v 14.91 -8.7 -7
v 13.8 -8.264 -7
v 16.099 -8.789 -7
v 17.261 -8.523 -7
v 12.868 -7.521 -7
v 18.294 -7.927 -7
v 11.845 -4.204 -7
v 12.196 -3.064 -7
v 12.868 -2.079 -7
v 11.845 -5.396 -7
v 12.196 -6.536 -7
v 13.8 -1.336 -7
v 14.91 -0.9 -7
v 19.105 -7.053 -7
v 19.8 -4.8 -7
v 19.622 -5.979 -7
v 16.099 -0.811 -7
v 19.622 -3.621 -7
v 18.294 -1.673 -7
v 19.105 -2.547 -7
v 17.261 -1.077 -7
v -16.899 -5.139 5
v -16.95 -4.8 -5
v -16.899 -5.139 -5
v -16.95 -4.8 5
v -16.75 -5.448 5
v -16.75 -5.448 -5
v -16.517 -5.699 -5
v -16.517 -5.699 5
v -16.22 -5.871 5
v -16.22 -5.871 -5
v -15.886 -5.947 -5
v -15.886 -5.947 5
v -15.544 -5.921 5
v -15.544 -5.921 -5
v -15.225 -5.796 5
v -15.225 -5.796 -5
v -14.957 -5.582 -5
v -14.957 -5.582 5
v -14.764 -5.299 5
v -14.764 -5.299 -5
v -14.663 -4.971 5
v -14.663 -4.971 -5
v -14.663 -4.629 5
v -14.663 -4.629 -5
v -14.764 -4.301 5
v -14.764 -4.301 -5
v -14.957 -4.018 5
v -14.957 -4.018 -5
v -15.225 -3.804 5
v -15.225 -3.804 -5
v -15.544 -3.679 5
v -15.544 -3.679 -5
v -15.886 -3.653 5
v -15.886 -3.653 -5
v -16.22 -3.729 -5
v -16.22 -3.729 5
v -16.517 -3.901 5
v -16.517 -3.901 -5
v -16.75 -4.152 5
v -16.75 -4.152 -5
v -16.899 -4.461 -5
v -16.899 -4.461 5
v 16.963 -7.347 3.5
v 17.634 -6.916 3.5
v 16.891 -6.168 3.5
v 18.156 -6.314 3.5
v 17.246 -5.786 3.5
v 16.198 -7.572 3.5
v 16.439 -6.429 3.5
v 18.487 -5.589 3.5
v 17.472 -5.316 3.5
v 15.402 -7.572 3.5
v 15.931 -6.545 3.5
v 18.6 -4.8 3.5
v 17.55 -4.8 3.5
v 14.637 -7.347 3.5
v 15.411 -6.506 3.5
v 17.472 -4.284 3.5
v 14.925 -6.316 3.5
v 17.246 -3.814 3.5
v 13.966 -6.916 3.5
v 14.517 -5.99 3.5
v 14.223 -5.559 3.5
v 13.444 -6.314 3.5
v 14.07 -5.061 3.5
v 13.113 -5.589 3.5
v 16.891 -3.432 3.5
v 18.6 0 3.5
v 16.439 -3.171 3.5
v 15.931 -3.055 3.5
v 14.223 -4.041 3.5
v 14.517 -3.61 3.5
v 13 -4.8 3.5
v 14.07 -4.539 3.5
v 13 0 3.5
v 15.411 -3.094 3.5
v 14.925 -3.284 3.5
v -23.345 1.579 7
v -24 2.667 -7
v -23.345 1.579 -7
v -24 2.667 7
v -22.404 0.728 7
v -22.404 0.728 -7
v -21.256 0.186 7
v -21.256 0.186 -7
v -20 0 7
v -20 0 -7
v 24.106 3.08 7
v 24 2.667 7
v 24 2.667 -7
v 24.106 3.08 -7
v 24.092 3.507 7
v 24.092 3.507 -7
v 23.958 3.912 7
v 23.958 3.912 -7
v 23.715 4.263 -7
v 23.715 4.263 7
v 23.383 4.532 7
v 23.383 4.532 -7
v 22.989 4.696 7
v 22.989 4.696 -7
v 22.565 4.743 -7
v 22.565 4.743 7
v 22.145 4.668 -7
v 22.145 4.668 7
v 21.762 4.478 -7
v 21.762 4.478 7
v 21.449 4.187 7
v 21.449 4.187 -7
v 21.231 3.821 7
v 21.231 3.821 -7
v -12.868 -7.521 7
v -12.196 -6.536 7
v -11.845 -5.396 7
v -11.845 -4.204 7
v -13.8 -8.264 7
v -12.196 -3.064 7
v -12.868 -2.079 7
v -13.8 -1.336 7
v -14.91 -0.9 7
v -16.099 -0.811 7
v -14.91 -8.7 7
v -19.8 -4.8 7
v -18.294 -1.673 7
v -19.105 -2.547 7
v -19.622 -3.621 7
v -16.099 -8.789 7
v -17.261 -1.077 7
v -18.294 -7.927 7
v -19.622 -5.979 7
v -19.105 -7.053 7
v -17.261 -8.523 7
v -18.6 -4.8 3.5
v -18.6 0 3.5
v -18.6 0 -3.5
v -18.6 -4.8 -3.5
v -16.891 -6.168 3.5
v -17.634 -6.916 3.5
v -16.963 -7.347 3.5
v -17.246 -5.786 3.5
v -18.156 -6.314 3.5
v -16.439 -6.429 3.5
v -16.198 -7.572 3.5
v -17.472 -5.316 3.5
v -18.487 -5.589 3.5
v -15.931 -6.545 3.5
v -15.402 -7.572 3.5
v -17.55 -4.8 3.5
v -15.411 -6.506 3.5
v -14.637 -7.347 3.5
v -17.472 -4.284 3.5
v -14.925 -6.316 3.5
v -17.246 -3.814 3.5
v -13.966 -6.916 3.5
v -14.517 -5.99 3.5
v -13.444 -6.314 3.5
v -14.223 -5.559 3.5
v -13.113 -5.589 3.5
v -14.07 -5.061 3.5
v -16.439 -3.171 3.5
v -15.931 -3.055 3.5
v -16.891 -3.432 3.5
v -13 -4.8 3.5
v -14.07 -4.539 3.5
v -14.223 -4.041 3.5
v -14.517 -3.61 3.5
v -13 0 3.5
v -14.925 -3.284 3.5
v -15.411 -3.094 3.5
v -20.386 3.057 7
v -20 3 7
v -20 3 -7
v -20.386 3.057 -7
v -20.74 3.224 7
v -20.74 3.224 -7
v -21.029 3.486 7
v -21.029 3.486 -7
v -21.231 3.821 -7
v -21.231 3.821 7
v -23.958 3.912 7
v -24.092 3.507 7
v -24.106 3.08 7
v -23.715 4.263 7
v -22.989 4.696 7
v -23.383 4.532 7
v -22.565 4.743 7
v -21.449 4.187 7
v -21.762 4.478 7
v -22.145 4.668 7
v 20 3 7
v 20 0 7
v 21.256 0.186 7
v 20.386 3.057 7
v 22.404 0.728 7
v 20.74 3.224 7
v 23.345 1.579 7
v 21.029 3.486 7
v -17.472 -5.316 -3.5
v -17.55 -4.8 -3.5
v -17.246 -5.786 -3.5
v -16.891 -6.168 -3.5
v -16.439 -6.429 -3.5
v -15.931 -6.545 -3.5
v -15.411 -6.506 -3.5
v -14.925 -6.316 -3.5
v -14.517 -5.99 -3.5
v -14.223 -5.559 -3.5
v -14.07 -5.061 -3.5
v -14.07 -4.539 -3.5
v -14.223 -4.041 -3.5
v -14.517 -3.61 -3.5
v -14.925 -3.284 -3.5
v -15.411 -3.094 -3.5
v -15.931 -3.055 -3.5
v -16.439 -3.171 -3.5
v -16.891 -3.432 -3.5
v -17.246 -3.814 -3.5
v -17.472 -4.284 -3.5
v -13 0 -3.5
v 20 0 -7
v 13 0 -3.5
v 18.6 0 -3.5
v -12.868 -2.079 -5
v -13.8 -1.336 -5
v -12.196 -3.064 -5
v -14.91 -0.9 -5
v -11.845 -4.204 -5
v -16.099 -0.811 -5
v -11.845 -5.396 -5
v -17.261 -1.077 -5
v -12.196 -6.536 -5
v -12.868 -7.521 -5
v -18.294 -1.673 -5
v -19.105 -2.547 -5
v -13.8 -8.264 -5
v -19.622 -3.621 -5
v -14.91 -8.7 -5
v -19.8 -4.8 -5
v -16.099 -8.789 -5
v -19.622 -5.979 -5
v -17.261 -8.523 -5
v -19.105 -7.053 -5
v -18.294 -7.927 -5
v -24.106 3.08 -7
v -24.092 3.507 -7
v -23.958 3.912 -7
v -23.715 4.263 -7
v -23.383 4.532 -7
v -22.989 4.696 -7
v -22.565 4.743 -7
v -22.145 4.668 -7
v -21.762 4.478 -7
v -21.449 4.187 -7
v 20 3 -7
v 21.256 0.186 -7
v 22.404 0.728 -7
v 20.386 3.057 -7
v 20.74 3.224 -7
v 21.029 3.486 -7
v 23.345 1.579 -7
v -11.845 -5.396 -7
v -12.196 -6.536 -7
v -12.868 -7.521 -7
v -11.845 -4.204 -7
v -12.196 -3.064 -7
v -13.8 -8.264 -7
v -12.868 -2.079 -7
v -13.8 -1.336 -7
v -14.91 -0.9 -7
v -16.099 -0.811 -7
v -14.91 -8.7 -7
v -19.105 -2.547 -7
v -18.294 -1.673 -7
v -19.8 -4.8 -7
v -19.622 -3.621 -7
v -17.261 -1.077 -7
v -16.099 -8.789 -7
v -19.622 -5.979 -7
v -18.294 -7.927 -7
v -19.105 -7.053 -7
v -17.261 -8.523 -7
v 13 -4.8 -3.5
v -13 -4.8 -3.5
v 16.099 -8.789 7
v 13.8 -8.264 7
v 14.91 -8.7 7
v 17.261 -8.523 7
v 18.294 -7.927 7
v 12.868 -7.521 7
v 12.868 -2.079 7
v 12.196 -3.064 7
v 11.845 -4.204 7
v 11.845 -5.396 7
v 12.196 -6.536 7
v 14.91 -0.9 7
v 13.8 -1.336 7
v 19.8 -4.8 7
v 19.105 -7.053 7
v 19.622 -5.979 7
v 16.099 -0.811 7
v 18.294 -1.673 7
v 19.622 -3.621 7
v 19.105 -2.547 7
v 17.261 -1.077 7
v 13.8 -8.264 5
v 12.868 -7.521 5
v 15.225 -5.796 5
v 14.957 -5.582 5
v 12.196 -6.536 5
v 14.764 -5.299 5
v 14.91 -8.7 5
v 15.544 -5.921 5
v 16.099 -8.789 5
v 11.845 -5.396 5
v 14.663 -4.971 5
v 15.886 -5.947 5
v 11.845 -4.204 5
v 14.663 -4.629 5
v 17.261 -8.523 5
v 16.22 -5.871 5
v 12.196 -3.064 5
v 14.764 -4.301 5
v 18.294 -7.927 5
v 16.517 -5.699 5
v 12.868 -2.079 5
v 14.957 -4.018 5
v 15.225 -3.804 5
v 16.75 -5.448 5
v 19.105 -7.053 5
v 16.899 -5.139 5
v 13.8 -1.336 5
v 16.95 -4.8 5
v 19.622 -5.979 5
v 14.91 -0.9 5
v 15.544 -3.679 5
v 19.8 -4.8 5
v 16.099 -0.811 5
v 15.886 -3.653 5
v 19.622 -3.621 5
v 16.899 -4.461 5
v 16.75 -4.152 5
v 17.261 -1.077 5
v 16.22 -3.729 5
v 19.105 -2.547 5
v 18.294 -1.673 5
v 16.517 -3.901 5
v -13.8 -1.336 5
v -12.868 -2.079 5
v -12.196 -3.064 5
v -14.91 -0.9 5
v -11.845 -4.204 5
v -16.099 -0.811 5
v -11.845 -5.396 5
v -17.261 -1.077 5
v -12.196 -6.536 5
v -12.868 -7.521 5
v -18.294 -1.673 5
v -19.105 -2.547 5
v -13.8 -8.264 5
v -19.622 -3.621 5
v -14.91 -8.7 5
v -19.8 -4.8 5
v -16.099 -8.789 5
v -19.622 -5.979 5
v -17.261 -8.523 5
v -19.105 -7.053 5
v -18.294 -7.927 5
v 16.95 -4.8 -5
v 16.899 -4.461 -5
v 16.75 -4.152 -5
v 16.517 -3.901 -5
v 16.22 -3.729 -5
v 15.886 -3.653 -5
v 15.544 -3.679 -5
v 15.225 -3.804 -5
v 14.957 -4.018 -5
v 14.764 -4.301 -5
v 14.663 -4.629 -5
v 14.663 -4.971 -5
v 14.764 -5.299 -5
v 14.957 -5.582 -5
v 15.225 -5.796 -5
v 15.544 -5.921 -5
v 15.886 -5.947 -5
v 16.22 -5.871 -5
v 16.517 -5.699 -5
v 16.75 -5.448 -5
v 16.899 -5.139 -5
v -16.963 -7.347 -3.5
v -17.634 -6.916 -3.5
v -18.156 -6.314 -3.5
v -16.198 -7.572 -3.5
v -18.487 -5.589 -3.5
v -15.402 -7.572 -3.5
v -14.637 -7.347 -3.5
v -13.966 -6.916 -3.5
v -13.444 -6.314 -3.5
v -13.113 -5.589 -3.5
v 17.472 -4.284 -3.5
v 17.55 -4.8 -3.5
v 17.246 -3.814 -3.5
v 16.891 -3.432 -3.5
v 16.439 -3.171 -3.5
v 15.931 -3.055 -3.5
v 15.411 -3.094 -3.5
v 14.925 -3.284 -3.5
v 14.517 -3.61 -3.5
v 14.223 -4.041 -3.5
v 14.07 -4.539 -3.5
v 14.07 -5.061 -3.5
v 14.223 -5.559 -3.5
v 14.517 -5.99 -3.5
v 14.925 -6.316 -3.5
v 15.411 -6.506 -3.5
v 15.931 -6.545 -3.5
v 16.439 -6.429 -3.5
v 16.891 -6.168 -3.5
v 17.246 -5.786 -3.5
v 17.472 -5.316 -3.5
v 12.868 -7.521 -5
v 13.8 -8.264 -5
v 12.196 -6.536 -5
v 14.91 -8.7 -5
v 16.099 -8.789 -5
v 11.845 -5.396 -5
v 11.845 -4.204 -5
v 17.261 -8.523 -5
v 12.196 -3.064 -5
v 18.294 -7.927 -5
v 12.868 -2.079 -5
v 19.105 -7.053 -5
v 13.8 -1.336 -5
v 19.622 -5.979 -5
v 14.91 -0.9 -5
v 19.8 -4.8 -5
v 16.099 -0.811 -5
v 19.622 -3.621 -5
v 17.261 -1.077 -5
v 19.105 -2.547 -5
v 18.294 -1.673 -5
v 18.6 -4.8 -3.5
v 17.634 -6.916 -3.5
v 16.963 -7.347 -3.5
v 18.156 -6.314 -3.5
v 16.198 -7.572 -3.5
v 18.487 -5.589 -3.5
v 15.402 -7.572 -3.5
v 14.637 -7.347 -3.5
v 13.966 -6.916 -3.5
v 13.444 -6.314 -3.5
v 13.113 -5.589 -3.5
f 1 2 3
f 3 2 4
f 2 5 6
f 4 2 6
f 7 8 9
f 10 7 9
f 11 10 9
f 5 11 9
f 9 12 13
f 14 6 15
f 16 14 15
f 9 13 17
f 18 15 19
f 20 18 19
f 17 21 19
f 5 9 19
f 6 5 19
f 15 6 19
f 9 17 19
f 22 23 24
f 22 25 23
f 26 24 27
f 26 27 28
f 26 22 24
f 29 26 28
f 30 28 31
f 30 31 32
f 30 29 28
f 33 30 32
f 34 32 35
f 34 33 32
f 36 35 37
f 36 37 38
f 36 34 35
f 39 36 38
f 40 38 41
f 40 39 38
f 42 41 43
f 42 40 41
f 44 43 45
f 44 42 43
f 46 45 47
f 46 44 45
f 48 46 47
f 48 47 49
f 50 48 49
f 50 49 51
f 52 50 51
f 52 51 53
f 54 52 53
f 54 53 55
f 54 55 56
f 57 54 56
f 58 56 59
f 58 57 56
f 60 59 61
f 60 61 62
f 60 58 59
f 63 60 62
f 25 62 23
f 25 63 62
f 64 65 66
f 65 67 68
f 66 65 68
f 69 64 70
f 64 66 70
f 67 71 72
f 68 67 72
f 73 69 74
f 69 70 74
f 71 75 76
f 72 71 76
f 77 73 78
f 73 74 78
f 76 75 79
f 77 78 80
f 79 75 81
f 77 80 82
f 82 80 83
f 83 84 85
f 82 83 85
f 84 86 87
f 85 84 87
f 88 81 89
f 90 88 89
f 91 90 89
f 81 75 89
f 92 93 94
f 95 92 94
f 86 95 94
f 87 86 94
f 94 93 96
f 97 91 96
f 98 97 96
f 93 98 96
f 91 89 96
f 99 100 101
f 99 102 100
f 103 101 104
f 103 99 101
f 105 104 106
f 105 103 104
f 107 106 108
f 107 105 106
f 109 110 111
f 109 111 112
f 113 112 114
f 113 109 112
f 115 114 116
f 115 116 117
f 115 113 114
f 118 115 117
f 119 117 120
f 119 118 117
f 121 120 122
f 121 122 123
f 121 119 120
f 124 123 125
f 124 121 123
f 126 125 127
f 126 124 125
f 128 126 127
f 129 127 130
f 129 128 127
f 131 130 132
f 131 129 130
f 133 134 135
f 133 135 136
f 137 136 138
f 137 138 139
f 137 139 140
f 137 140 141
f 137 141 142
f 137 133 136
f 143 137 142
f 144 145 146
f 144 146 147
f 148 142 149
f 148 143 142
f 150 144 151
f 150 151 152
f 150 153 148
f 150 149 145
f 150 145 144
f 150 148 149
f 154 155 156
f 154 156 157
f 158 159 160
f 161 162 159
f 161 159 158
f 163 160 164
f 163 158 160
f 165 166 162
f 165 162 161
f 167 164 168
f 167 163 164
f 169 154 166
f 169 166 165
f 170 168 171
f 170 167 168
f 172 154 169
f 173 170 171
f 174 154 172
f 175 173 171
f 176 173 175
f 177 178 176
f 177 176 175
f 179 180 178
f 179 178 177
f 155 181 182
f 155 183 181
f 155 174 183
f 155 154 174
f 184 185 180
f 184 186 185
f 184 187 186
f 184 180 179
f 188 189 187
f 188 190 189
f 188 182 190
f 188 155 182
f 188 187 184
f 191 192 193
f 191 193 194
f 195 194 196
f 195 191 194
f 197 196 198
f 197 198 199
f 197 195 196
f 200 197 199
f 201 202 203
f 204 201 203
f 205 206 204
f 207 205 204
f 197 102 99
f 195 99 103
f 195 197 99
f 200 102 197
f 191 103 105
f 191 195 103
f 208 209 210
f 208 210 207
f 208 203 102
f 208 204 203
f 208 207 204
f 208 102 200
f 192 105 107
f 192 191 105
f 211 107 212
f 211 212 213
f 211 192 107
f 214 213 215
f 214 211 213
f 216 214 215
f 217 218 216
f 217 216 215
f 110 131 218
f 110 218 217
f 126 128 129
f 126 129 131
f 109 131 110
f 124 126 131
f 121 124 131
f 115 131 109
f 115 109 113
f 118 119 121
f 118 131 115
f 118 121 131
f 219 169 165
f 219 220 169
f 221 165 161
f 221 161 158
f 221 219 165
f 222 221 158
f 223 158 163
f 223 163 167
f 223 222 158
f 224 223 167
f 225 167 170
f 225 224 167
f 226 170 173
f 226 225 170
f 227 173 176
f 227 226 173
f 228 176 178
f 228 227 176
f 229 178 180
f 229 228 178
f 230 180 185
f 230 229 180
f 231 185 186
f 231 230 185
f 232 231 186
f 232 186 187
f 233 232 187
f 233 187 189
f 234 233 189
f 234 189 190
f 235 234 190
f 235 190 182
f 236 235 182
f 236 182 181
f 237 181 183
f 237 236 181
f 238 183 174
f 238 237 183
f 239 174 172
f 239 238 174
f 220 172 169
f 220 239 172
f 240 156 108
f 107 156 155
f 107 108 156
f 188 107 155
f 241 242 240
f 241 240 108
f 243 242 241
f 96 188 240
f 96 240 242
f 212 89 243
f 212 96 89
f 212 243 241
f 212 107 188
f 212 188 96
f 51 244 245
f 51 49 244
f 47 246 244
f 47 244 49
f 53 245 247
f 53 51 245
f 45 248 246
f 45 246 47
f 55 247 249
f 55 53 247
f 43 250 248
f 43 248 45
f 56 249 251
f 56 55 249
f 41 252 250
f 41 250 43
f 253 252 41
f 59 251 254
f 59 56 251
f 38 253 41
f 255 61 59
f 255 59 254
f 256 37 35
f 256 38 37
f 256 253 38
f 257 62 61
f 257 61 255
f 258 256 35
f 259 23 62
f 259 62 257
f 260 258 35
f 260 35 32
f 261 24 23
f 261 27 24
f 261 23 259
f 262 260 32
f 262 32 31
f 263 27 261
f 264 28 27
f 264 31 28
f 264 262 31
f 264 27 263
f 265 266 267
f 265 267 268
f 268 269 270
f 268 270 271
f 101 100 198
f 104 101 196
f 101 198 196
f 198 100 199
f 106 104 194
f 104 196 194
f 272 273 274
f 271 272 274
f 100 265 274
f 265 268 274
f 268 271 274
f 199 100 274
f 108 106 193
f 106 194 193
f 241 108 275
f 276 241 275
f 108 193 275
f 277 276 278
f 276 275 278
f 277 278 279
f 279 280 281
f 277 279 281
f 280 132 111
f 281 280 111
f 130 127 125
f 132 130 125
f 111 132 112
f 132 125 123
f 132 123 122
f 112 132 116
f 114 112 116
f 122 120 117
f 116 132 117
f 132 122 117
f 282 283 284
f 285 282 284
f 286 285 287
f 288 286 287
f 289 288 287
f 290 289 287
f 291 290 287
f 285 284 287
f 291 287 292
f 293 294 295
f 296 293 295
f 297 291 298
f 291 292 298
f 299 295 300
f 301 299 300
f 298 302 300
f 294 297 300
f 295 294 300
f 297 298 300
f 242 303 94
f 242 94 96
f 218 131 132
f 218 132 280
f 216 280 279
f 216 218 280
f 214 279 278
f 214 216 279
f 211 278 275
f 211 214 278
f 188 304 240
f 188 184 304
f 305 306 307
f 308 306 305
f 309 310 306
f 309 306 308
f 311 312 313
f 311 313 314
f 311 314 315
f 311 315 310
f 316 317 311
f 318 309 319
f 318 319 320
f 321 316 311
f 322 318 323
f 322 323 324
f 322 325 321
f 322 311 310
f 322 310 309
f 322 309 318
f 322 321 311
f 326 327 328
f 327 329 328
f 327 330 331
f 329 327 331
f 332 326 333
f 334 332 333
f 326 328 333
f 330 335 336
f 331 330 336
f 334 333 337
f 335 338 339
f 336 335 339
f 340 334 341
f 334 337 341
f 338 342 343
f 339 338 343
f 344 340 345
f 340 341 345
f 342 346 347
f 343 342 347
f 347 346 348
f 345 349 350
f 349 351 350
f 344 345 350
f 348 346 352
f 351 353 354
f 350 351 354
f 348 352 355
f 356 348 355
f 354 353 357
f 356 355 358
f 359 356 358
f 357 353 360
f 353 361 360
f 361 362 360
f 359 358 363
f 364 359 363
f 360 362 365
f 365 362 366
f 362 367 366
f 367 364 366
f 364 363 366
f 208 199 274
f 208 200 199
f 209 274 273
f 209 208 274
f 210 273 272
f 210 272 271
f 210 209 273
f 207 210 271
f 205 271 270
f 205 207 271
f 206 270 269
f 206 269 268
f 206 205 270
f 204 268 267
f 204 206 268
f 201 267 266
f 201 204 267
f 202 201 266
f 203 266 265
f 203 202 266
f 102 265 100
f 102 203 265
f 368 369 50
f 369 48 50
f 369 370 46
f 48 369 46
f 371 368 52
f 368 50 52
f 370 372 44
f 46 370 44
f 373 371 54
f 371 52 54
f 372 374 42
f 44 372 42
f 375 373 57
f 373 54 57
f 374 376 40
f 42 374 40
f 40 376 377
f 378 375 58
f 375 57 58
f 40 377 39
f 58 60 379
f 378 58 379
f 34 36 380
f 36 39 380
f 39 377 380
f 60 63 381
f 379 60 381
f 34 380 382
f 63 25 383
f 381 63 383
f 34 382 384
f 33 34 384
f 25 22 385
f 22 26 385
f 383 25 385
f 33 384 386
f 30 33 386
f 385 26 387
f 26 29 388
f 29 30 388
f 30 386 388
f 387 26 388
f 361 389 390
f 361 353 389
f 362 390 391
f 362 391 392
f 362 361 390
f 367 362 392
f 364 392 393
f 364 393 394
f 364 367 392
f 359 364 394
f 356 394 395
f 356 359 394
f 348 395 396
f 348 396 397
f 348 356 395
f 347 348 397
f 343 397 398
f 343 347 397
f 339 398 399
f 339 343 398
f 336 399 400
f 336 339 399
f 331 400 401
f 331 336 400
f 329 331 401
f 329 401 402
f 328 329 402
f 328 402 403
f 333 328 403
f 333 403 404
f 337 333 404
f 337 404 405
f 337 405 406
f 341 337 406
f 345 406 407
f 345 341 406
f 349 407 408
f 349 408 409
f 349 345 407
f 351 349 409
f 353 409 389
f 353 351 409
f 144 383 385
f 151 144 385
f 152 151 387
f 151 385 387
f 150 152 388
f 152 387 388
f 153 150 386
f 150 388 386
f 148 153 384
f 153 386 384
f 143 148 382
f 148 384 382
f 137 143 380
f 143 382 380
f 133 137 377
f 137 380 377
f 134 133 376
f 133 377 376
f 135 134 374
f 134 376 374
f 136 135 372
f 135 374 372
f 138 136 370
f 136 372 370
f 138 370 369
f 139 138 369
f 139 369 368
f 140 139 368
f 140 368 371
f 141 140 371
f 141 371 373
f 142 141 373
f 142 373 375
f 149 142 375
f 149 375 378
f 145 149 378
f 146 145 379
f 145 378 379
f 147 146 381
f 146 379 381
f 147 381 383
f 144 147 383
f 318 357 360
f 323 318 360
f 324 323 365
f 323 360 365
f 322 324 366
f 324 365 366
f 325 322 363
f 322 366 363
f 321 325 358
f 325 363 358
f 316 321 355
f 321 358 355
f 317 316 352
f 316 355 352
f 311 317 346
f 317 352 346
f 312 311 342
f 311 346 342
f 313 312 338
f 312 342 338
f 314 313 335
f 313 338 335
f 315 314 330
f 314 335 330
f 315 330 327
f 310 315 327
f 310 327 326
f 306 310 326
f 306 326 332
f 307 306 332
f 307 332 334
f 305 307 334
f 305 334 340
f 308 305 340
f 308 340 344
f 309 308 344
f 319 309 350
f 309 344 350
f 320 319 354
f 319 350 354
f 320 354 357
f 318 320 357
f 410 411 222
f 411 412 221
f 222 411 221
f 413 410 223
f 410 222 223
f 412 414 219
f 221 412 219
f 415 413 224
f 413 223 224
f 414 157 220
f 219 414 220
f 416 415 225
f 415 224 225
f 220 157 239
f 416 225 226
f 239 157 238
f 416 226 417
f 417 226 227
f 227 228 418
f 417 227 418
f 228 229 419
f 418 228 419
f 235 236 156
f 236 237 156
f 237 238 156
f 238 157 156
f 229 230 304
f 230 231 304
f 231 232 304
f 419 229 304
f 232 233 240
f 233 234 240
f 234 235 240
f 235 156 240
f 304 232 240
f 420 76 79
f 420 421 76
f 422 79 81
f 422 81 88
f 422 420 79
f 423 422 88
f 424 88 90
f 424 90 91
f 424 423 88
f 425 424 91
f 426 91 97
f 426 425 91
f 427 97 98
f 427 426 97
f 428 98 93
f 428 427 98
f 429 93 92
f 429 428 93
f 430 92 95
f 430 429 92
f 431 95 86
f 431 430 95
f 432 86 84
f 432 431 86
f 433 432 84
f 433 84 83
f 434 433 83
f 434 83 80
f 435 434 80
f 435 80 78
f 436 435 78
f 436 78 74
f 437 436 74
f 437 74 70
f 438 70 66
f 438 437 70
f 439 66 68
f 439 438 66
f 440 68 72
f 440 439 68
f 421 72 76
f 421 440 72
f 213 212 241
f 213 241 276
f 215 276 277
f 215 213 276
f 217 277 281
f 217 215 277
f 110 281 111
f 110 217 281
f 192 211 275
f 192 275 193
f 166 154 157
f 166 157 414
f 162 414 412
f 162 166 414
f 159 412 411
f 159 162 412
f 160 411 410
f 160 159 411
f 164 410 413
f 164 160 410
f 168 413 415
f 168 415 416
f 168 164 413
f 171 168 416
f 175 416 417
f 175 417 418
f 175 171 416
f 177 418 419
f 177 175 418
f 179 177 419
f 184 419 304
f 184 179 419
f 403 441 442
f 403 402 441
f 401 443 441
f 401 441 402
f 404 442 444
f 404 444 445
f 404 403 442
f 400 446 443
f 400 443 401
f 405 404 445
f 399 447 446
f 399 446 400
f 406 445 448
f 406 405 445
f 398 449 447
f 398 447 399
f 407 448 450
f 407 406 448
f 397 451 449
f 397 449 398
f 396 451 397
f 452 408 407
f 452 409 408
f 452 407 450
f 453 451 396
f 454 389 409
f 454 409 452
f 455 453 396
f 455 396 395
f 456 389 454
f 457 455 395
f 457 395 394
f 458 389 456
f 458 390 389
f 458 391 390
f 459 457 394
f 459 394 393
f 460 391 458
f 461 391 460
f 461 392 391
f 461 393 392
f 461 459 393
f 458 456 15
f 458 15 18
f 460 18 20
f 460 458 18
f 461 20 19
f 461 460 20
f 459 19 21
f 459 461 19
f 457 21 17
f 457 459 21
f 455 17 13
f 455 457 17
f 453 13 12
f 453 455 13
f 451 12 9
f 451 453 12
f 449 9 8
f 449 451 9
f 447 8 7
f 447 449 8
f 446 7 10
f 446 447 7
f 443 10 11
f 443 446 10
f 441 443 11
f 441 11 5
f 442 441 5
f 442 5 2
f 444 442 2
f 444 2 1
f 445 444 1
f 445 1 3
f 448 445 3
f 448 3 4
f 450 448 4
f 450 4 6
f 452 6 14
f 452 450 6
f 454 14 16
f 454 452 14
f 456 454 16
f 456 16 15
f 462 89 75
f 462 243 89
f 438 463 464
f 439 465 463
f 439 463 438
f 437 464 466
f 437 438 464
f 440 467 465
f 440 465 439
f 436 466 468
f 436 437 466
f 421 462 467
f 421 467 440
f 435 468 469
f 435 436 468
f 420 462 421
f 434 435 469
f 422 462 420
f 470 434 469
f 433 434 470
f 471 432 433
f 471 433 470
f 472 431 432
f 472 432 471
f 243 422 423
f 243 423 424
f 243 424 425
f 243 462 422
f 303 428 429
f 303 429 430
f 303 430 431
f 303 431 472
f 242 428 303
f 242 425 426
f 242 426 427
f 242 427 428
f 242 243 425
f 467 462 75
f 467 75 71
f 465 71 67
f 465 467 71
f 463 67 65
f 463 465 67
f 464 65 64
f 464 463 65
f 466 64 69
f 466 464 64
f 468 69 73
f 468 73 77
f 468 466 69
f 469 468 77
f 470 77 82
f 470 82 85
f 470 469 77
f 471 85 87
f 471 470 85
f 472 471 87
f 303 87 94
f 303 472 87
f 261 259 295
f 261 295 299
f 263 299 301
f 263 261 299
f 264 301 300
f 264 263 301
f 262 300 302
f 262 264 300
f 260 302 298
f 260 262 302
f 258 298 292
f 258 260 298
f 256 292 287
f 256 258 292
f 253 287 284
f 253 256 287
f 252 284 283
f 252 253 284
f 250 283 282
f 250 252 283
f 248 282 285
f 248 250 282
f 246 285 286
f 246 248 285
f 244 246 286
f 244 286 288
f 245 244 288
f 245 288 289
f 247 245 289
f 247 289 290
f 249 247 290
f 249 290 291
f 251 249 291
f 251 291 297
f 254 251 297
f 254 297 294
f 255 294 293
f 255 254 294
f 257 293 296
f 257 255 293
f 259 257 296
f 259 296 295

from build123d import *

# Parameters (mm, degrees)
BOSS_EXTRUDE1_DEPTH   = 7
SKETCH2_R             = 1.75
BOSS_EXTRUDE2_DEPTH   = 3.5
SKETCH3_R             = 1.15
BOSS_EXTRUDE3_DEPTH   = 5
BOSS_EXTRUDE3_2_DEPTH = 5
SKETCH4_R             = 4
BOSS_EXTRUDE4_DEPTH   = 2


with BuildPart() as part:
    # Sketch1 → Boss-Extrude1 (new body, symmetric)
    with BuildSketch(Plane.XY):
        with BuildLine():
            Line((-20, 0), (20, 0))
            ThreePointArc((20, 0), (22.40370085, 0.727782058), (24, 2.666666667))
            ThreePointArc((24, 2.666666667), (23.192307692, 4.628205128), (21.230769231, 3.820512821))
            ThreePointArc((21.230769231, 3.820512821), (20.739600262, 3.223932941), (20, 3))
            Line((20, 3), (-20, 3))
            ThreePointArc((-20, 3), (-20.739600262, 3.223932941), (-21.230769231, 3.820512821))
            ThreePointArc((-21.230769231, 3.820512821), (-23.192307692, 4.628205128), (-24, 2.666666667))
            ThreePointArc((-24, 2.666666667), (-22.40370085, 0.727782058), (-20, 0))
        make_face()
    extrude(amount=BOSS_EXTRUDE1_DEPTH, both=True)

    # Sketch2 → Boss-Extrude2 (add, symmetric)
    with BuildSketch(Plane.XY):
        with BuildLine():
            Line((18.6, 0), (18.6, -4.8))
            ThreePointArc((18.6, -4.8), (15.8, -7.6), (13, -4.8))
            Line((13, -4.8), (13, 0))
            Line((13, 0), (18.6, 0))
        make_face()
        with Locations((15.8, -4.8)):
            Circle(SKETCH2_R, mode=Mode.SUBTRACT)
        with BuildLine():
            Line((-13, 0), (-18.6, 0))
            Line((-18.6, 0), (-18.6, -4.8))
            ThreePointArc((-18.6, -4.8), (-15.8, -7.6), (-13, -4.8))
            Line((-13, -4.8), (-13, 0))
        make_face()
        with Locations(Location((-15.8, -4.8, 0), (0, 0, 180))):  # turned: the seam where the file's is
            Circle(SKETCH2_R, mode=Mode.SUBTRACT)
    extrude(amount=BOSS_EXTRUDE2_DEPTH, both=True)


with BuildPart() as body_2:
    # Sketch3 → Boss-Extrude3 (new body, symmetric)
    with BuildSketch(Plane.XY):
        with Locations((15.8, -4.8)):
            Circle(SKETCH3_R)
    extrude(amount=BOSS_EXTRUDE3_DEPTH, both=True)



with BuildPart() as body_3:
    # Sketch3 → Boss-Extrude3 2 (new body, symmetric)
    with BuildSketch(Plane.XY):
        with Locations(Location((-15.8, -4.8, 0), (0, 0, 180))):  # turned: the seam where the file's is
            Circle(SKETCH3_R)
    extrude(amount=BOSS_EXTRUDE3_2_DEPTH, both=True)


with BuildPart() as body_2_1:
    add(body_2.part)

    add(body_3.part)  # Boss-Extrude4 merges body 3
    # Sketch4 → Boss-Extrude4 (add)
    with BuildSketch(Plane.XY.offset(5)):
        with Locations((15.8, -4.8)):
            Circle(SKETCH4_R)
        with Locations(Location((-15.8, -4.8, 0), (0, 0, 180))):  # turned: the seam where the file's is
            Circle(SKETCH4_R)
    boss_extrude4 = extrude(amount=BOSS_EXTRUDE4_DEPTH)

    # Mirror1: Boss-Extrude4 across plane
    add(boss_extrude4.mirror(Plane.XY))


solid = Compound([part.part, body_2_1.part])
